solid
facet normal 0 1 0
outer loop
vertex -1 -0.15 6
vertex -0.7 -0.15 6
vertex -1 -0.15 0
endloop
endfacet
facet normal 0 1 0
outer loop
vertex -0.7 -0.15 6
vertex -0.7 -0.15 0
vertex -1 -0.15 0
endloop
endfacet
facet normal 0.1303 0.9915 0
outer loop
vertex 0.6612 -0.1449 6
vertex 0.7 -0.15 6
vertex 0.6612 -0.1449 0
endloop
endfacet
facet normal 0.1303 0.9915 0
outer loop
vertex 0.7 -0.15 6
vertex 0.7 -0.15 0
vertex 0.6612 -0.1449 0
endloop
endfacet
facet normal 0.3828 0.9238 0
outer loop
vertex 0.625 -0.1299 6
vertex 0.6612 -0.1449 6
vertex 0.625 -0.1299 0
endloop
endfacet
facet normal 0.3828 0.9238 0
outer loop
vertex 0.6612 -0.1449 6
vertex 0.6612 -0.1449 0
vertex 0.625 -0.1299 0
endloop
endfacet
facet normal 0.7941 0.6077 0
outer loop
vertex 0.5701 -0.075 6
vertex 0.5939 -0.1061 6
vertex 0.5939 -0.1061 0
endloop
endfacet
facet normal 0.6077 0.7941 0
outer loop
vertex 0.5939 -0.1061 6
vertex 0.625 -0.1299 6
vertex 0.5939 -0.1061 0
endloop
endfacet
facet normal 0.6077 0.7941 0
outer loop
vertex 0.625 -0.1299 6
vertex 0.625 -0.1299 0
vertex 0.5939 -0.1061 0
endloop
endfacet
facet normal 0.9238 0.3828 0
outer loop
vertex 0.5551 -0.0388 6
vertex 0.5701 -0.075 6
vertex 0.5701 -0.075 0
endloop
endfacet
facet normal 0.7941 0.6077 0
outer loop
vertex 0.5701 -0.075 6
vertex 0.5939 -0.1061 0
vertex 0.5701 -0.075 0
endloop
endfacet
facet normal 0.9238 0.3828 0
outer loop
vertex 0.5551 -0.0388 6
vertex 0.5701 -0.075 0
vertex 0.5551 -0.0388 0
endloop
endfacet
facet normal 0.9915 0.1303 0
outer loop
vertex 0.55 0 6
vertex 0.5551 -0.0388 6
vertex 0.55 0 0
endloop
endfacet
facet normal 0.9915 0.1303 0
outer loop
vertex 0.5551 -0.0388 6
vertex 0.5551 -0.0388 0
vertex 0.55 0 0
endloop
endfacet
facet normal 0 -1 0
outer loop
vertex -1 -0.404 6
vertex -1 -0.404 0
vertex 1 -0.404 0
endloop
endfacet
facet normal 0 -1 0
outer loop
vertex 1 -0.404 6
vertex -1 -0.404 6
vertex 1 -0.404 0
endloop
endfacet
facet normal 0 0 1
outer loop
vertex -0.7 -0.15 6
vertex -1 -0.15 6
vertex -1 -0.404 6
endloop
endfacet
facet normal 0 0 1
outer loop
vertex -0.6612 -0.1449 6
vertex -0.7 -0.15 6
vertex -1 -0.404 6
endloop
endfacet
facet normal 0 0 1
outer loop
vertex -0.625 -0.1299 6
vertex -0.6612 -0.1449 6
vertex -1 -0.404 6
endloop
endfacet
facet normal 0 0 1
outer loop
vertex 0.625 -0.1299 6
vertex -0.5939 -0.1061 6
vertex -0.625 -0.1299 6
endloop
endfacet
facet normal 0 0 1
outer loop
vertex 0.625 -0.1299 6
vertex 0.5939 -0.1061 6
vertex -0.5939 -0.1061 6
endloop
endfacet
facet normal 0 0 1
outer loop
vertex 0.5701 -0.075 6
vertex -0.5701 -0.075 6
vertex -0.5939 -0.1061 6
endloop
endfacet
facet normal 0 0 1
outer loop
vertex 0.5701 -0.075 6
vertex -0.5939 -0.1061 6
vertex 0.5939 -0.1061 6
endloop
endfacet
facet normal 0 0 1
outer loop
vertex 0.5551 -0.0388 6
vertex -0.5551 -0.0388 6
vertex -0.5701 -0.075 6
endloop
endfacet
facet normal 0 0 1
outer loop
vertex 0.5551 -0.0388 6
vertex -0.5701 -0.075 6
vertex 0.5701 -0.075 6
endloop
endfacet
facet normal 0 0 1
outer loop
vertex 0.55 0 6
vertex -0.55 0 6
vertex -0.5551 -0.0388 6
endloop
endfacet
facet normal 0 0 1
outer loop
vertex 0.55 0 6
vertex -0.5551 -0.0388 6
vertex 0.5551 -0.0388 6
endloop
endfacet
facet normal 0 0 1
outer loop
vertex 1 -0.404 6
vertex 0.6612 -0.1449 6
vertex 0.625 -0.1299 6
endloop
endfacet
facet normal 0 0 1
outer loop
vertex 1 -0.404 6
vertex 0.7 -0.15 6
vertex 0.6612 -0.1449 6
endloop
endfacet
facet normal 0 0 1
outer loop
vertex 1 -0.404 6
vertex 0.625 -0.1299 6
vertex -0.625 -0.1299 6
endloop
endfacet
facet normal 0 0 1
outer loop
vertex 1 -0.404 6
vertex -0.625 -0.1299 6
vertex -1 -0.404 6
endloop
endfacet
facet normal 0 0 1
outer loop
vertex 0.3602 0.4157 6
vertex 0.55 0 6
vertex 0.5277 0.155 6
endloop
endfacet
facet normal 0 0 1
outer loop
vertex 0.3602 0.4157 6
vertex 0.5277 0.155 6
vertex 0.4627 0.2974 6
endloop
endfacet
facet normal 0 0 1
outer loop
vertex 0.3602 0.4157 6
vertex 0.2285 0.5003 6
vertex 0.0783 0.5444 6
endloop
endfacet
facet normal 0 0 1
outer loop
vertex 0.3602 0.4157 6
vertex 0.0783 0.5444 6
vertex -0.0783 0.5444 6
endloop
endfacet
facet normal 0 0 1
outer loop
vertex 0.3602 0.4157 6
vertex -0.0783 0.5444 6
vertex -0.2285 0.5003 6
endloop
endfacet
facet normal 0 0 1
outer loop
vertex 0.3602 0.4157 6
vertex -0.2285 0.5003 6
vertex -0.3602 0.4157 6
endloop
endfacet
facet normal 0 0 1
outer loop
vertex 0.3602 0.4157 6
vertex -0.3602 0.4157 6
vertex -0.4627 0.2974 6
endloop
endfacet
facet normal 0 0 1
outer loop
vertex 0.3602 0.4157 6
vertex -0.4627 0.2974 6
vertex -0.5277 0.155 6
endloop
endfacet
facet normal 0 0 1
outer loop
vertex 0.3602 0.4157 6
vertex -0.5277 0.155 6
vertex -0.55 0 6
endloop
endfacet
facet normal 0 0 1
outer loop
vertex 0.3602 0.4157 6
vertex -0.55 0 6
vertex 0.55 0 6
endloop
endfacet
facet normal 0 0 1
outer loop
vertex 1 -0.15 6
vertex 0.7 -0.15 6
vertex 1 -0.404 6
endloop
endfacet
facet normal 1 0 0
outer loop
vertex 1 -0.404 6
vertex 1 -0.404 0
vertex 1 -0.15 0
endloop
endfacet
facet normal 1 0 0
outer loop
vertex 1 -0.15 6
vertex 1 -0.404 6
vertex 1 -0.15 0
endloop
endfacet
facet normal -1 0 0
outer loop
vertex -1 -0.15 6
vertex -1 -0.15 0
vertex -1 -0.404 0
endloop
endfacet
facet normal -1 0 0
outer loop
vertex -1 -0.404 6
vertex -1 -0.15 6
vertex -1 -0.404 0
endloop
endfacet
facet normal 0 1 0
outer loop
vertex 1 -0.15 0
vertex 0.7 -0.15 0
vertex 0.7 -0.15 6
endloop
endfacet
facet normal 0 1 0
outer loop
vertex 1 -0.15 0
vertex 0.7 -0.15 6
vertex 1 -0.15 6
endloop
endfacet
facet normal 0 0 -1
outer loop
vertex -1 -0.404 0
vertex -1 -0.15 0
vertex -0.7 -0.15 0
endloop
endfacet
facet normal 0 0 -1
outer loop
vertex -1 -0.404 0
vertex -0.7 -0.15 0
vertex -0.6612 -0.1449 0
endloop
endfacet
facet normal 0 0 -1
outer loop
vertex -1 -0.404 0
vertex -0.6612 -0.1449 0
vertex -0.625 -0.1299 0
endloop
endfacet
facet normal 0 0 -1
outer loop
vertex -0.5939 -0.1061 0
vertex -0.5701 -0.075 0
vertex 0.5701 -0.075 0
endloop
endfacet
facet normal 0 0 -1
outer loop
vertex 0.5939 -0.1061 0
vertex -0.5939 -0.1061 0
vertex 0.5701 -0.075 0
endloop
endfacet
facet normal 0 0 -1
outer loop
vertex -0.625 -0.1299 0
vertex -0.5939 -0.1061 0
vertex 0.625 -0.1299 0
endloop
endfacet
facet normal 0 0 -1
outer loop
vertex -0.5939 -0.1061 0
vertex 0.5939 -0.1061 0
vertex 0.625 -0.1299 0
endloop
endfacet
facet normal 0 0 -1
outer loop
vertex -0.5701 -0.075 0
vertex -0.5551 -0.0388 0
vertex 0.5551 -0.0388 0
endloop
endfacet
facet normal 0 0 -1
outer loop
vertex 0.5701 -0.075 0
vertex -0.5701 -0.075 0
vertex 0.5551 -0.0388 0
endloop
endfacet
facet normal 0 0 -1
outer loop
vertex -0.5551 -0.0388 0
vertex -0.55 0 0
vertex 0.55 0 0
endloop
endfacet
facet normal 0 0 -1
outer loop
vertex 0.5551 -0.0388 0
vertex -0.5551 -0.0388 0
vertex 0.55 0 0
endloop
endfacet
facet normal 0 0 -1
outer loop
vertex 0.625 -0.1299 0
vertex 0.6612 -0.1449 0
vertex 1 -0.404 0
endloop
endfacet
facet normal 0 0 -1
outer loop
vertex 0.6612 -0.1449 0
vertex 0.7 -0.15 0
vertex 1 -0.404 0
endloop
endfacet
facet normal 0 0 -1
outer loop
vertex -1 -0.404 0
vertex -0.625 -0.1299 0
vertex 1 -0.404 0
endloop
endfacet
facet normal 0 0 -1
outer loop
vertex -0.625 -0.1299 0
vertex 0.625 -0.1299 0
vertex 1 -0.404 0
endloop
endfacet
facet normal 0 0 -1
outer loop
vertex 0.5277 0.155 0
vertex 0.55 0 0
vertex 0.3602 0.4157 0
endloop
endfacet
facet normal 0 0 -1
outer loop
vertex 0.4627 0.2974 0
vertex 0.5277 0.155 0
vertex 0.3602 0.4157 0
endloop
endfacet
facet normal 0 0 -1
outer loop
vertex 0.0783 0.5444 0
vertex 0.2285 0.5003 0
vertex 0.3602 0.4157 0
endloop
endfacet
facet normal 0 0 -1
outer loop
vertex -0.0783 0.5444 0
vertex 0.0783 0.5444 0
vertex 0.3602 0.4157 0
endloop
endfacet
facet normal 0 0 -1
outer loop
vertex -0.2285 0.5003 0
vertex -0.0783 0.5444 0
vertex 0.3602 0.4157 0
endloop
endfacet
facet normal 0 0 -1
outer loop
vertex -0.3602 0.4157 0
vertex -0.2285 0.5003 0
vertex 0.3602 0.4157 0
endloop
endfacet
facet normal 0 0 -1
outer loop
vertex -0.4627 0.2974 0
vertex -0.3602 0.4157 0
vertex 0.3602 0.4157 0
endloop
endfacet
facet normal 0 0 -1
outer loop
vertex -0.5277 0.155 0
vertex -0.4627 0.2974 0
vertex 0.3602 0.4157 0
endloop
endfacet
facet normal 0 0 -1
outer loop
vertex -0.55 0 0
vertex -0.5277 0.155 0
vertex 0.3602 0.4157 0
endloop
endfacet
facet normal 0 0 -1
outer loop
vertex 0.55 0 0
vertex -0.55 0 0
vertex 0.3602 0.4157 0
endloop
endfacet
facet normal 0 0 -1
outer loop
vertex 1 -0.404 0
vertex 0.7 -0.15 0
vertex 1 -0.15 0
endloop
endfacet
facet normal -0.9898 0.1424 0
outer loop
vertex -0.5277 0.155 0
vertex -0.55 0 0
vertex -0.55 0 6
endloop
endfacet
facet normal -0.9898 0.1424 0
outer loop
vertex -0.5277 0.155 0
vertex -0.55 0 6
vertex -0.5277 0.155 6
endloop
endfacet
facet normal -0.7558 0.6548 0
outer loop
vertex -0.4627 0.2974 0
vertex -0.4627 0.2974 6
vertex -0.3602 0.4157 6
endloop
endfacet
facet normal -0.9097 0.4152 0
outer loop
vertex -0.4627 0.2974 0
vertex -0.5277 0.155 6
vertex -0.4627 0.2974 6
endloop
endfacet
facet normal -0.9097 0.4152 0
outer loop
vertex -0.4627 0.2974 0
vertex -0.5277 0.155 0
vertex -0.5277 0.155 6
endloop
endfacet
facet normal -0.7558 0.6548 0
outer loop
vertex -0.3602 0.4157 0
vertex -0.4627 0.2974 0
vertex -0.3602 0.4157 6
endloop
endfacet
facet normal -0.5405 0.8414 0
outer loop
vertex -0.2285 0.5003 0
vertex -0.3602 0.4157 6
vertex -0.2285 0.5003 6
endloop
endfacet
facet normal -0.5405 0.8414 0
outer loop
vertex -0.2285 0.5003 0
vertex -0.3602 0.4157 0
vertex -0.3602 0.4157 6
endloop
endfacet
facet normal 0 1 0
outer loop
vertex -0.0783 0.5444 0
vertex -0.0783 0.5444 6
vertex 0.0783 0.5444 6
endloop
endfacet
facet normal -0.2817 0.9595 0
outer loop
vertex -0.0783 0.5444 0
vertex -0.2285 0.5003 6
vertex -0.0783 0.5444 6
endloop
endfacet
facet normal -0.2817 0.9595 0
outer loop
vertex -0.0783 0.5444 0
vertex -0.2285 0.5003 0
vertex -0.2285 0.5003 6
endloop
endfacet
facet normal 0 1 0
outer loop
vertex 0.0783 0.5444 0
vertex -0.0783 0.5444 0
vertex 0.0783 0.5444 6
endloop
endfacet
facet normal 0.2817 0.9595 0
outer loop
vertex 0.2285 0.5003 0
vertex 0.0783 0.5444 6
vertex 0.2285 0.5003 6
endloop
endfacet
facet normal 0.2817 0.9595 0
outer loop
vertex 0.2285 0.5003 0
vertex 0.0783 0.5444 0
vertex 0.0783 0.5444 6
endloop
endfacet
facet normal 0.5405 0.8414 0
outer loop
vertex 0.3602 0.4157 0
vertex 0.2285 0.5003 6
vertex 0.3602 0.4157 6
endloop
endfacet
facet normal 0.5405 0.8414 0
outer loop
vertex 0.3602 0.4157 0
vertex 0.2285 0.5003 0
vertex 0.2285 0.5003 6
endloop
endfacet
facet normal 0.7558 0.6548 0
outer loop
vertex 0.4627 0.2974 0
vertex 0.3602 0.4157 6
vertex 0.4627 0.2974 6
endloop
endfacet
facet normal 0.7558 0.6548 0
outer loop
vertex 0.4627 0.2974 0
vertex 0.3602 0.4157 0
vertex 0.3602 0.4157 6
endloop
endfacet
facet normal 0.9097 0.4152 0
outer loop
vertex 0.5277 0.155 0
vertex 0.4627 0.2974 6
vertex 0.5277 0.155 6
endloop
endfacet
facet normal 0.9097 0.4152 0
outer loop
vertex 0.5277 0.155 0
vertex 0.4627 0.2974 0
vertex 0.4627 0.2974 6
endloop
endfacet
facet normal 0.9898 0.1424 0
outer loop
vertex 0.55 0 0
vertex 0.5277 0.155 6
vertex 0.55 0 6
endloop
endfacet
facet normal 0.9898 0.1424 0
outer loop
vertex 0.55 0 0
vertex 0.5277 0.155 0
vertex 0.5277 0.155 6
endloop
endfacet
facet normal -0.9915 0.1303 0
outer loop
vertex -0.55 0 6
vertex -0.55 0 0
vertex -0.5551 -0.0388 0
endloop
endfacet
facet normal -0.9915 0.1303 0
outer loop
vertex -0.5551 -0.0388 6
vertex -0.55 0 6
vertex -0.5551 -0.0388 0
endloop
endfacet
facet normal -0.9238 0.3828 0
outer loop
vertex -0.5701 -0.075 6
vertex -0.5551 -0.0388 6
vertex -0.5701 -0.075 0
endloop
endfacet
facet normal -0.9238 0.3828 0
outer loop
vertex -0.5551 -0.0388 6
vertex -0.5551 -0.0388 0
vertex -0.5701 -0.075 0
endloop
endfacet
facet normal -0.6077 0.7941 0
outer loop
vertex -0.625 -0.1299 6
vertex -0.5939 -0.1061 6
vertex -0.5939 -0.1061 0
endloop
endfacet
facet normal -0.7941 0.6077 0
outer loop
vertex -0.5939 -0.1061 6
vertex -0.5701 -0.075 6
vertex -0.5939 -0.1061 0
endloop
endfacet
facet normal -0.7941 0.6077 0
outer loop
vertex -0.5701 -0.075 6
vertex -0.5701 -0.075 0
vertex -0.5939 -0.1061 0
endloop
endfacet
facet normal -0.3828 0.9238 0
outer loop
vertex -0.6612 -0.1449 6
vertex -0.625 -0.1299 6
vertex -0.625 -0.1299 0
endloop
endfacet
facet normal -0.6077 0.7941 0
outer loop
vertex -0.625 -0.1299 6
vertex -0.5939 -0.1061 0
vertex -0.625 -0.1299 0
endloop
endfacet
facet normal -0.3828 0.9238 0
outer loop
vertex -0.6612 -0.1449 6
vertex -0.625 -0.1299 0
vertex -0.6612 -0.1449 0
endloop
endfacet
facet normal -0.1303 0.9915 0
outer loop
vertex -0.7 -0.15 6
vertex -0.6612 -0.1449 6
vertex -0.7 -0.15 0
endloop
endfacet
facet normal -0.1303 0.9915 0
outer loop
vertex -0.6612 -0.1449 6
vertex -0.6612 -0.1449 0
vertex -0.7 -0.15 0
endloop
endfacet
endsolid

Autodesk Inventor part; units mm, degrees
ref_plane "YZ Plane" through (0, 0, 0) normal (1, 0, 0) x (0, 1, 0)
ref_plane "XZ Plane" through (0, 0, 0) normal (0, 1, 0) x (-1, 0, 0)
sketch "Sketch1" plane through (0, 0, 0) normal (0, 0, 1) x (1, 0, 0)
  arc A0 (0.55, 0) -> (-0.55, 0) centre (0, 0) ccw
  arc A1 (0.55, 0) -> (0.7, -0.15) centre (0.7, 0) ccw
  arc A2 (-0.7, -0.15) -> (-0.55, 0) centre (-0.7, 0) ccw
  line L0 (0.7, -0.15) -> (1, -0.15)
  line L1 (-0.7, -0.15) -> (-1, -0.15)
  line L2 (-1, -0.15) -> (-1, -0.404)
  line L3 (-1, -0.404) -> (1, -0.404)
  line L4 (1, -0.404) -> (1, -0.15)
  dimension "d4" = 0.3
  dimension "d5" = 0.3
  dimension "d6" = 0
  dimension "d7" = 0
  dimension "d8" = 0.3
  dimension "d9" = 0.3
  dimension "d10" = 0.254
extrude "Extrusion1" add sketch "Sketch1" along normal blind 6
ref_plane "Work Plane1" through (-1, -0.404, 0) normal (0, -1, 0) x (1, 0, 0)
sketch "Sketch2" plane through (-1, -0.404, 0) normal (0, -1, 0) x (1, 0, 0)
  line L0 (2, 0) -> (0, 0) projected
  line L1 (0, 0) -> (0, 6) projected
  point P0 (1, 0)
  point P1 (1, 3)
  dimension "d14" = 3
  dimension "d15" = 1
properties part number "zab" material "Rubber"
